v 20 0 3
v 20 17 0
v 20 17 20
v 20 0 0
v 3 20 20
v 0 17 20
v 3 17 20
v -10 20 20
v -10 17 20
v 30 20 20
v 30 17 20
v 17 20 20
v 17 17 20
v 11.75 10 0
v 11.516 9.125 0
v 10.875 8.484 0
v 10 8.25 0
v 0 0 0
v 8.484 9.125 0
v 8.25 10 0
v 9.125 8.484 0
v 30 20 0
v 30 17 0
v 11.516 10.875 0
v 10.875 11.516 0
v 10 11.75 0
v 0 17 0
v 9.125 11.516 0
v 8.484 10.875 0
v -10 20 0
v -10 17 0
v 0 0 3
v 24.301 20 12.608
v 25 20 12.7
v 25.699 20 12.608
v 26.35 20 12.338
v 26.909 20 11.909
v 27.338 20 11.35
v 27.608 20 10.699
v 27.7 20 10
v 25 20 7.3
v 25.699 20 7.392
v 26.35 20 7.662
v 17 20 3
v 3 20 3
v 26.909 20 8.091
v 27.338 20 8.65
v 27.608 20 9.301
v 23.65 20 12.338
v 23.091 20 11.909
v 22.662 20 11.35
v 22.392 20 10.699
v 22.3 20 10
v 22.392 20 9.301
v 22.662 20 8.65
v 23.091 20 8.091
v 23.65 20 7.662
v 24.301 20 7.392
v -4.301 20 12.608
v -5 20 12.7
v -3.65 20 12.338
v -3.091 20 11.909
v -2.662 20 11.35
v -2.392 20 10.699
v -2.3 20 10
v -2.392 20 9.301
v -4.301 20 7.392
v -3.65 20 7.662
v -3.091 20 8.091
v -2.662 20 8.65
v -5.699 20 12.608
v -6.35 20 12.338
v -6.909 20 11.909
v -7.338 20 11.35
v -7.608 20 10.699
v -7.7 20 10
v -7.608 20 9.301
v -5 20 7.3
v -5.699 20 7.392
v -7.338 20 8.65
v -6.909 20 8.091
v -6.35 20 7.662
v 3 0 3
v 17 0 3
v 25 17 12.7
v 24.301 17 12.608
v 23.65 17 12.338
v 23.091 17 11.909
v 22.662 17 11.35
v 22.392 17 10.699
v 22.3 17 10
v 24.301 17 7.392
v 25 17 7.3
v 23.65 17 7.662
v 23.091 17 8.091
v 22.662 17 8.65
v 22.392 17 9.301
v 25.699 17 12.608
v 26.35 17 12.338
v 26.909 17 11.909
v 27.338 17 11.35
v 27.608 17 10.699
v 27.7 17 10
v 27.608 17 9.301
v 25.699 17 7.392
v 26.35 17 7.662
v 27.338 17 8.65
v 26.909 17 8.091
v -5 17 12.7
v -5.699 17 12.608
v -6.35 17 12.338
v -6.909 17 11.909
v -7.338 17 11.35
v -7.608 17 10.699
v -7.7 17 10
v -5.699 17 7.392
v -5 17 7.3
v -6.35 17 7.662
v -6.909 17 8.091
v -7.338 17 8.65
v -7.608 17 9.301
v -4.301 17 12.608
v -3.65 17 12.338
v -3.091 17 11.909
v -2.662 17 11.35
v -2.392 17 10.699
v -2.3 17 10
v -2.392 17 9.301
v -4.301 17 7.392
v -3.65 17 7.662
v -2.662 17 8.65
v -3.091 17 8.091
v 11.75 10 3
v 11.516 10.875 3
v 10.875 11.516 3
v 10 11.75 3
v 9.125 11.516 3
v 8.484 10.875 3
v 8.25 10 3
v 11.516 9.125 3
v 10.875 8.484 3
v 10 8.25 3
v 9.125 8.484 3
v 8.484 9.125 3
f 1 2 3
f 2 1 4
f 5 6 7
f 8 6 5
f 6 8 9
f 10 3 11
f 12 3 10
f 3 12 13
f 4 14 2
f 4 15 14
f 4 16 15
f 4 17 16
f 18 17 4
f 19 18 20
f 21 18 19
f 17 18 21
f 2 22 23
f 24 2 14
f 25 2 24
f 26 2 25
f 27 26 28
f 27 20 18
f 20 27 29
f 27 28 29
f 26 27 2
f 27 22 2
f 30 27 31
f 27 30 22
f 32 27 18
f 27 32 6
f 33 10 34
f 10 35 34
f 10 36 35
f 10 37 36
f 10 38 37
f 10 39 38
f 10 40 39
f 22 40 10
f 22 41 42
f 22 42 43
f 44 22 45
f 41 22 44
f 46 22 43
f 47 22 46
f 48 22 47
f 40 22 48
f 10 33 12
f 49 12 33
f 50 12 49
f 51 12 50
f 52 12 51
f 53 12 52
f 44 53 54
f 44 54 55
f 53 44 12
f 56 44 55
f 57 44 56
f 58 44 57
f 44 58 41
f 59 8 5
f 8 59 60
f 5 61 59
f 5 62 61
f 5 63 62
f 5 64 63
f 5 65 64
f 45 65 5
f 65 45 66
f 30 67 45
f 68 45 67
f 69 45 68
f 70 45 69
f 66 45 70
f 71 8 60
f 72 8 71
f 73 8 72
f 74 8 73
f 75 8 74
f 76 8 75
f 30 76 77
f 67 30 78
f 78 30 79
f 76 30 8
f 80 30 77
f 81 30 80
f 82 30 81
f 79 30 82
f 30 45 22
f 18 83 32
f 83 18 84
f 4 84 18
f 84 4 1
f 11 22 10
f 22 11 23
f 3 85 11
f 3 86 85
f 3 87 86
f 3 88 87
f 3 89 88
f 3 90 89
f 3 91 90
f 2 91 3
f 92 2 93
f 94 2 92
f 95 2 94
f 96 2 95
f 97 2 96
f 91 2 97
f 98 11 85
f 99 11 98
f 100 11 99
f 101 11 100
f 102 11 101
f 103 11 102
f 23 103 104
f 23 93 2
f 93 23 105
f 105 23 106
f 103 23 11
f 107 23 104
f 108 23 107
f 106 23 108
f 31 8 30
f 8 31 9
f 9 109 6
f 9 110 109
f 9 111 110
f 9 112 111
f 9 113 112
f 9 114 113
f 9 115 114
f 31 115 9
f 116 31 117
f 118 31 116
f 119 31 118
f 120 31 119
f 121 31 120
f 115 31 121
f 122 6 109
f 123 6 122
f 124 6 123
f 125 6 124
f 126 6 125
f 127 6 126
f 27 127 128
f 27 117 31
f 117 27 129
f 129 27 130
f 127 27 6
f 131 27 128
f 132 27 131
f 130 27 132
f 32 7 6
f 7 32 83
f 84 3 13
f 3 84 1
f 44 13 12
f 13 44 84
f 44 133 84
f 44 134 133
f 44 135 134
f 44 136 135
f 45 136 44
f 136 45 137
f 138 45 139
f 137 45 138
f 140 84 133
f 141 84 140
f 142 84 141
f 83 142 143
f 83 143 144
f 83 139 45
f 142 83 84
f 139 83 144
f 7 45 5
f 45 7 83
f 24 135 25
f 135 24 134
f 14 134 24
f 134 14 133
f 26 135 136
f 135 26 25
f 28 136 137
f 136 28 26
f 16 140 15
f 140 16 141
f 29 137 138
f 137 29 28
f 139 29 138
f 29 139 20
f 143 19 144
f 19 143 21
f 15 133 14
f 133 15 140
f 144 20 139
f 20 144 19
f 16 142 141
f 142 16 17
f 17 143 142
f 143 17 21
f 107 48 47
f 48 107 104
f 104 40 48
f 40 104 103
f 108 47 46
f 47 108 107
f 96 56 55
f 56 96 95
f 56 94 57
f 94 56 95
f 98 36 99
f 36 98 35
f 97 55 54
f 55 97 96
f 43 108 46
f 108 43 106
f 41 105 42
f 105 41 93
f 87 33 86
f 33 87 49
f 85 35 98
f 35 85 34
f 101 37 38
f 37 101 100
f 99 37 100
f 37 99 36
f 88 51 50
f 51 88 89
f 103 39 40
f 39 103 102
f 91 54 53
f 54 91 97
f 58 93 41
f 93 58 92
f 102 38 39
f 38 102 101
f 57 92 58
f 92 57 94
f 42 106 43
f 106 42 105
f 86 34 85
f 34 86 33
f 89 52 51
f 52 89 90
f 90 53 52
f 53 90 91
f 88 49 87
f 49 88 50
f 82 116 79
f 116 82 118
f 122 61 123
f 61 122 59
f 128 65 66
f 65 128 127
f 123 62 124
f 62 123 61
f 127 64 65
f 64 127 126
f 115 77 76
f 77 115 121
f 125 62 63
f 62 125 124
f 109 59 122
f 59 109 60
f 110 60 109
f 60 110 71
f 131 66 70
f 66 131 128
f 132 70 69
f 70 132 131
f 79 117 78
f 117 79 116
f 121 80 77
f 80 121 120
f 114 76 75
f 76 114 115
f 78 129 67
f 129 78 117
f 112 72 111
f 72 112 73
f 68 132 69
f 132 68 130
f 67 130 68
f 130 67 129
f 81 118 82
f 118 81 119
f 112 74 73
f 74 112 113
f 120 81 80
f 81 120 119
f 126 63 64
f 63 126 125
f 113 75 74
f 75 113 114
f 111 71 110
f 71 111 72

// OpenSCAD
difference()
{
    union()
    {
        cube([20,20,20]);
        
        translate([20,17,0])
            cube([10,3,20]);
        
        translate([-10,17,0])
            cube([10,3,20]);
    }
    
    union()
    {
        translate([0,0,3])
            rotate([45,0,0])
                cube([20,30,20]);
        
        translate([3,0,3])
            cube([14,20,17]);
        
        translate([10,10,0])
            cylinder(d=3.5,h=3,$fn=12);
        
        translate([25,17,10])
            rotate([270,0,0])
                cylinder(d=5.4,h=3,$fn=24);
        
        translate([-5,17,10])
            rotate([270,0,0])
                cylinder(d=5.4,h=3,$fn=24);
    }

}
